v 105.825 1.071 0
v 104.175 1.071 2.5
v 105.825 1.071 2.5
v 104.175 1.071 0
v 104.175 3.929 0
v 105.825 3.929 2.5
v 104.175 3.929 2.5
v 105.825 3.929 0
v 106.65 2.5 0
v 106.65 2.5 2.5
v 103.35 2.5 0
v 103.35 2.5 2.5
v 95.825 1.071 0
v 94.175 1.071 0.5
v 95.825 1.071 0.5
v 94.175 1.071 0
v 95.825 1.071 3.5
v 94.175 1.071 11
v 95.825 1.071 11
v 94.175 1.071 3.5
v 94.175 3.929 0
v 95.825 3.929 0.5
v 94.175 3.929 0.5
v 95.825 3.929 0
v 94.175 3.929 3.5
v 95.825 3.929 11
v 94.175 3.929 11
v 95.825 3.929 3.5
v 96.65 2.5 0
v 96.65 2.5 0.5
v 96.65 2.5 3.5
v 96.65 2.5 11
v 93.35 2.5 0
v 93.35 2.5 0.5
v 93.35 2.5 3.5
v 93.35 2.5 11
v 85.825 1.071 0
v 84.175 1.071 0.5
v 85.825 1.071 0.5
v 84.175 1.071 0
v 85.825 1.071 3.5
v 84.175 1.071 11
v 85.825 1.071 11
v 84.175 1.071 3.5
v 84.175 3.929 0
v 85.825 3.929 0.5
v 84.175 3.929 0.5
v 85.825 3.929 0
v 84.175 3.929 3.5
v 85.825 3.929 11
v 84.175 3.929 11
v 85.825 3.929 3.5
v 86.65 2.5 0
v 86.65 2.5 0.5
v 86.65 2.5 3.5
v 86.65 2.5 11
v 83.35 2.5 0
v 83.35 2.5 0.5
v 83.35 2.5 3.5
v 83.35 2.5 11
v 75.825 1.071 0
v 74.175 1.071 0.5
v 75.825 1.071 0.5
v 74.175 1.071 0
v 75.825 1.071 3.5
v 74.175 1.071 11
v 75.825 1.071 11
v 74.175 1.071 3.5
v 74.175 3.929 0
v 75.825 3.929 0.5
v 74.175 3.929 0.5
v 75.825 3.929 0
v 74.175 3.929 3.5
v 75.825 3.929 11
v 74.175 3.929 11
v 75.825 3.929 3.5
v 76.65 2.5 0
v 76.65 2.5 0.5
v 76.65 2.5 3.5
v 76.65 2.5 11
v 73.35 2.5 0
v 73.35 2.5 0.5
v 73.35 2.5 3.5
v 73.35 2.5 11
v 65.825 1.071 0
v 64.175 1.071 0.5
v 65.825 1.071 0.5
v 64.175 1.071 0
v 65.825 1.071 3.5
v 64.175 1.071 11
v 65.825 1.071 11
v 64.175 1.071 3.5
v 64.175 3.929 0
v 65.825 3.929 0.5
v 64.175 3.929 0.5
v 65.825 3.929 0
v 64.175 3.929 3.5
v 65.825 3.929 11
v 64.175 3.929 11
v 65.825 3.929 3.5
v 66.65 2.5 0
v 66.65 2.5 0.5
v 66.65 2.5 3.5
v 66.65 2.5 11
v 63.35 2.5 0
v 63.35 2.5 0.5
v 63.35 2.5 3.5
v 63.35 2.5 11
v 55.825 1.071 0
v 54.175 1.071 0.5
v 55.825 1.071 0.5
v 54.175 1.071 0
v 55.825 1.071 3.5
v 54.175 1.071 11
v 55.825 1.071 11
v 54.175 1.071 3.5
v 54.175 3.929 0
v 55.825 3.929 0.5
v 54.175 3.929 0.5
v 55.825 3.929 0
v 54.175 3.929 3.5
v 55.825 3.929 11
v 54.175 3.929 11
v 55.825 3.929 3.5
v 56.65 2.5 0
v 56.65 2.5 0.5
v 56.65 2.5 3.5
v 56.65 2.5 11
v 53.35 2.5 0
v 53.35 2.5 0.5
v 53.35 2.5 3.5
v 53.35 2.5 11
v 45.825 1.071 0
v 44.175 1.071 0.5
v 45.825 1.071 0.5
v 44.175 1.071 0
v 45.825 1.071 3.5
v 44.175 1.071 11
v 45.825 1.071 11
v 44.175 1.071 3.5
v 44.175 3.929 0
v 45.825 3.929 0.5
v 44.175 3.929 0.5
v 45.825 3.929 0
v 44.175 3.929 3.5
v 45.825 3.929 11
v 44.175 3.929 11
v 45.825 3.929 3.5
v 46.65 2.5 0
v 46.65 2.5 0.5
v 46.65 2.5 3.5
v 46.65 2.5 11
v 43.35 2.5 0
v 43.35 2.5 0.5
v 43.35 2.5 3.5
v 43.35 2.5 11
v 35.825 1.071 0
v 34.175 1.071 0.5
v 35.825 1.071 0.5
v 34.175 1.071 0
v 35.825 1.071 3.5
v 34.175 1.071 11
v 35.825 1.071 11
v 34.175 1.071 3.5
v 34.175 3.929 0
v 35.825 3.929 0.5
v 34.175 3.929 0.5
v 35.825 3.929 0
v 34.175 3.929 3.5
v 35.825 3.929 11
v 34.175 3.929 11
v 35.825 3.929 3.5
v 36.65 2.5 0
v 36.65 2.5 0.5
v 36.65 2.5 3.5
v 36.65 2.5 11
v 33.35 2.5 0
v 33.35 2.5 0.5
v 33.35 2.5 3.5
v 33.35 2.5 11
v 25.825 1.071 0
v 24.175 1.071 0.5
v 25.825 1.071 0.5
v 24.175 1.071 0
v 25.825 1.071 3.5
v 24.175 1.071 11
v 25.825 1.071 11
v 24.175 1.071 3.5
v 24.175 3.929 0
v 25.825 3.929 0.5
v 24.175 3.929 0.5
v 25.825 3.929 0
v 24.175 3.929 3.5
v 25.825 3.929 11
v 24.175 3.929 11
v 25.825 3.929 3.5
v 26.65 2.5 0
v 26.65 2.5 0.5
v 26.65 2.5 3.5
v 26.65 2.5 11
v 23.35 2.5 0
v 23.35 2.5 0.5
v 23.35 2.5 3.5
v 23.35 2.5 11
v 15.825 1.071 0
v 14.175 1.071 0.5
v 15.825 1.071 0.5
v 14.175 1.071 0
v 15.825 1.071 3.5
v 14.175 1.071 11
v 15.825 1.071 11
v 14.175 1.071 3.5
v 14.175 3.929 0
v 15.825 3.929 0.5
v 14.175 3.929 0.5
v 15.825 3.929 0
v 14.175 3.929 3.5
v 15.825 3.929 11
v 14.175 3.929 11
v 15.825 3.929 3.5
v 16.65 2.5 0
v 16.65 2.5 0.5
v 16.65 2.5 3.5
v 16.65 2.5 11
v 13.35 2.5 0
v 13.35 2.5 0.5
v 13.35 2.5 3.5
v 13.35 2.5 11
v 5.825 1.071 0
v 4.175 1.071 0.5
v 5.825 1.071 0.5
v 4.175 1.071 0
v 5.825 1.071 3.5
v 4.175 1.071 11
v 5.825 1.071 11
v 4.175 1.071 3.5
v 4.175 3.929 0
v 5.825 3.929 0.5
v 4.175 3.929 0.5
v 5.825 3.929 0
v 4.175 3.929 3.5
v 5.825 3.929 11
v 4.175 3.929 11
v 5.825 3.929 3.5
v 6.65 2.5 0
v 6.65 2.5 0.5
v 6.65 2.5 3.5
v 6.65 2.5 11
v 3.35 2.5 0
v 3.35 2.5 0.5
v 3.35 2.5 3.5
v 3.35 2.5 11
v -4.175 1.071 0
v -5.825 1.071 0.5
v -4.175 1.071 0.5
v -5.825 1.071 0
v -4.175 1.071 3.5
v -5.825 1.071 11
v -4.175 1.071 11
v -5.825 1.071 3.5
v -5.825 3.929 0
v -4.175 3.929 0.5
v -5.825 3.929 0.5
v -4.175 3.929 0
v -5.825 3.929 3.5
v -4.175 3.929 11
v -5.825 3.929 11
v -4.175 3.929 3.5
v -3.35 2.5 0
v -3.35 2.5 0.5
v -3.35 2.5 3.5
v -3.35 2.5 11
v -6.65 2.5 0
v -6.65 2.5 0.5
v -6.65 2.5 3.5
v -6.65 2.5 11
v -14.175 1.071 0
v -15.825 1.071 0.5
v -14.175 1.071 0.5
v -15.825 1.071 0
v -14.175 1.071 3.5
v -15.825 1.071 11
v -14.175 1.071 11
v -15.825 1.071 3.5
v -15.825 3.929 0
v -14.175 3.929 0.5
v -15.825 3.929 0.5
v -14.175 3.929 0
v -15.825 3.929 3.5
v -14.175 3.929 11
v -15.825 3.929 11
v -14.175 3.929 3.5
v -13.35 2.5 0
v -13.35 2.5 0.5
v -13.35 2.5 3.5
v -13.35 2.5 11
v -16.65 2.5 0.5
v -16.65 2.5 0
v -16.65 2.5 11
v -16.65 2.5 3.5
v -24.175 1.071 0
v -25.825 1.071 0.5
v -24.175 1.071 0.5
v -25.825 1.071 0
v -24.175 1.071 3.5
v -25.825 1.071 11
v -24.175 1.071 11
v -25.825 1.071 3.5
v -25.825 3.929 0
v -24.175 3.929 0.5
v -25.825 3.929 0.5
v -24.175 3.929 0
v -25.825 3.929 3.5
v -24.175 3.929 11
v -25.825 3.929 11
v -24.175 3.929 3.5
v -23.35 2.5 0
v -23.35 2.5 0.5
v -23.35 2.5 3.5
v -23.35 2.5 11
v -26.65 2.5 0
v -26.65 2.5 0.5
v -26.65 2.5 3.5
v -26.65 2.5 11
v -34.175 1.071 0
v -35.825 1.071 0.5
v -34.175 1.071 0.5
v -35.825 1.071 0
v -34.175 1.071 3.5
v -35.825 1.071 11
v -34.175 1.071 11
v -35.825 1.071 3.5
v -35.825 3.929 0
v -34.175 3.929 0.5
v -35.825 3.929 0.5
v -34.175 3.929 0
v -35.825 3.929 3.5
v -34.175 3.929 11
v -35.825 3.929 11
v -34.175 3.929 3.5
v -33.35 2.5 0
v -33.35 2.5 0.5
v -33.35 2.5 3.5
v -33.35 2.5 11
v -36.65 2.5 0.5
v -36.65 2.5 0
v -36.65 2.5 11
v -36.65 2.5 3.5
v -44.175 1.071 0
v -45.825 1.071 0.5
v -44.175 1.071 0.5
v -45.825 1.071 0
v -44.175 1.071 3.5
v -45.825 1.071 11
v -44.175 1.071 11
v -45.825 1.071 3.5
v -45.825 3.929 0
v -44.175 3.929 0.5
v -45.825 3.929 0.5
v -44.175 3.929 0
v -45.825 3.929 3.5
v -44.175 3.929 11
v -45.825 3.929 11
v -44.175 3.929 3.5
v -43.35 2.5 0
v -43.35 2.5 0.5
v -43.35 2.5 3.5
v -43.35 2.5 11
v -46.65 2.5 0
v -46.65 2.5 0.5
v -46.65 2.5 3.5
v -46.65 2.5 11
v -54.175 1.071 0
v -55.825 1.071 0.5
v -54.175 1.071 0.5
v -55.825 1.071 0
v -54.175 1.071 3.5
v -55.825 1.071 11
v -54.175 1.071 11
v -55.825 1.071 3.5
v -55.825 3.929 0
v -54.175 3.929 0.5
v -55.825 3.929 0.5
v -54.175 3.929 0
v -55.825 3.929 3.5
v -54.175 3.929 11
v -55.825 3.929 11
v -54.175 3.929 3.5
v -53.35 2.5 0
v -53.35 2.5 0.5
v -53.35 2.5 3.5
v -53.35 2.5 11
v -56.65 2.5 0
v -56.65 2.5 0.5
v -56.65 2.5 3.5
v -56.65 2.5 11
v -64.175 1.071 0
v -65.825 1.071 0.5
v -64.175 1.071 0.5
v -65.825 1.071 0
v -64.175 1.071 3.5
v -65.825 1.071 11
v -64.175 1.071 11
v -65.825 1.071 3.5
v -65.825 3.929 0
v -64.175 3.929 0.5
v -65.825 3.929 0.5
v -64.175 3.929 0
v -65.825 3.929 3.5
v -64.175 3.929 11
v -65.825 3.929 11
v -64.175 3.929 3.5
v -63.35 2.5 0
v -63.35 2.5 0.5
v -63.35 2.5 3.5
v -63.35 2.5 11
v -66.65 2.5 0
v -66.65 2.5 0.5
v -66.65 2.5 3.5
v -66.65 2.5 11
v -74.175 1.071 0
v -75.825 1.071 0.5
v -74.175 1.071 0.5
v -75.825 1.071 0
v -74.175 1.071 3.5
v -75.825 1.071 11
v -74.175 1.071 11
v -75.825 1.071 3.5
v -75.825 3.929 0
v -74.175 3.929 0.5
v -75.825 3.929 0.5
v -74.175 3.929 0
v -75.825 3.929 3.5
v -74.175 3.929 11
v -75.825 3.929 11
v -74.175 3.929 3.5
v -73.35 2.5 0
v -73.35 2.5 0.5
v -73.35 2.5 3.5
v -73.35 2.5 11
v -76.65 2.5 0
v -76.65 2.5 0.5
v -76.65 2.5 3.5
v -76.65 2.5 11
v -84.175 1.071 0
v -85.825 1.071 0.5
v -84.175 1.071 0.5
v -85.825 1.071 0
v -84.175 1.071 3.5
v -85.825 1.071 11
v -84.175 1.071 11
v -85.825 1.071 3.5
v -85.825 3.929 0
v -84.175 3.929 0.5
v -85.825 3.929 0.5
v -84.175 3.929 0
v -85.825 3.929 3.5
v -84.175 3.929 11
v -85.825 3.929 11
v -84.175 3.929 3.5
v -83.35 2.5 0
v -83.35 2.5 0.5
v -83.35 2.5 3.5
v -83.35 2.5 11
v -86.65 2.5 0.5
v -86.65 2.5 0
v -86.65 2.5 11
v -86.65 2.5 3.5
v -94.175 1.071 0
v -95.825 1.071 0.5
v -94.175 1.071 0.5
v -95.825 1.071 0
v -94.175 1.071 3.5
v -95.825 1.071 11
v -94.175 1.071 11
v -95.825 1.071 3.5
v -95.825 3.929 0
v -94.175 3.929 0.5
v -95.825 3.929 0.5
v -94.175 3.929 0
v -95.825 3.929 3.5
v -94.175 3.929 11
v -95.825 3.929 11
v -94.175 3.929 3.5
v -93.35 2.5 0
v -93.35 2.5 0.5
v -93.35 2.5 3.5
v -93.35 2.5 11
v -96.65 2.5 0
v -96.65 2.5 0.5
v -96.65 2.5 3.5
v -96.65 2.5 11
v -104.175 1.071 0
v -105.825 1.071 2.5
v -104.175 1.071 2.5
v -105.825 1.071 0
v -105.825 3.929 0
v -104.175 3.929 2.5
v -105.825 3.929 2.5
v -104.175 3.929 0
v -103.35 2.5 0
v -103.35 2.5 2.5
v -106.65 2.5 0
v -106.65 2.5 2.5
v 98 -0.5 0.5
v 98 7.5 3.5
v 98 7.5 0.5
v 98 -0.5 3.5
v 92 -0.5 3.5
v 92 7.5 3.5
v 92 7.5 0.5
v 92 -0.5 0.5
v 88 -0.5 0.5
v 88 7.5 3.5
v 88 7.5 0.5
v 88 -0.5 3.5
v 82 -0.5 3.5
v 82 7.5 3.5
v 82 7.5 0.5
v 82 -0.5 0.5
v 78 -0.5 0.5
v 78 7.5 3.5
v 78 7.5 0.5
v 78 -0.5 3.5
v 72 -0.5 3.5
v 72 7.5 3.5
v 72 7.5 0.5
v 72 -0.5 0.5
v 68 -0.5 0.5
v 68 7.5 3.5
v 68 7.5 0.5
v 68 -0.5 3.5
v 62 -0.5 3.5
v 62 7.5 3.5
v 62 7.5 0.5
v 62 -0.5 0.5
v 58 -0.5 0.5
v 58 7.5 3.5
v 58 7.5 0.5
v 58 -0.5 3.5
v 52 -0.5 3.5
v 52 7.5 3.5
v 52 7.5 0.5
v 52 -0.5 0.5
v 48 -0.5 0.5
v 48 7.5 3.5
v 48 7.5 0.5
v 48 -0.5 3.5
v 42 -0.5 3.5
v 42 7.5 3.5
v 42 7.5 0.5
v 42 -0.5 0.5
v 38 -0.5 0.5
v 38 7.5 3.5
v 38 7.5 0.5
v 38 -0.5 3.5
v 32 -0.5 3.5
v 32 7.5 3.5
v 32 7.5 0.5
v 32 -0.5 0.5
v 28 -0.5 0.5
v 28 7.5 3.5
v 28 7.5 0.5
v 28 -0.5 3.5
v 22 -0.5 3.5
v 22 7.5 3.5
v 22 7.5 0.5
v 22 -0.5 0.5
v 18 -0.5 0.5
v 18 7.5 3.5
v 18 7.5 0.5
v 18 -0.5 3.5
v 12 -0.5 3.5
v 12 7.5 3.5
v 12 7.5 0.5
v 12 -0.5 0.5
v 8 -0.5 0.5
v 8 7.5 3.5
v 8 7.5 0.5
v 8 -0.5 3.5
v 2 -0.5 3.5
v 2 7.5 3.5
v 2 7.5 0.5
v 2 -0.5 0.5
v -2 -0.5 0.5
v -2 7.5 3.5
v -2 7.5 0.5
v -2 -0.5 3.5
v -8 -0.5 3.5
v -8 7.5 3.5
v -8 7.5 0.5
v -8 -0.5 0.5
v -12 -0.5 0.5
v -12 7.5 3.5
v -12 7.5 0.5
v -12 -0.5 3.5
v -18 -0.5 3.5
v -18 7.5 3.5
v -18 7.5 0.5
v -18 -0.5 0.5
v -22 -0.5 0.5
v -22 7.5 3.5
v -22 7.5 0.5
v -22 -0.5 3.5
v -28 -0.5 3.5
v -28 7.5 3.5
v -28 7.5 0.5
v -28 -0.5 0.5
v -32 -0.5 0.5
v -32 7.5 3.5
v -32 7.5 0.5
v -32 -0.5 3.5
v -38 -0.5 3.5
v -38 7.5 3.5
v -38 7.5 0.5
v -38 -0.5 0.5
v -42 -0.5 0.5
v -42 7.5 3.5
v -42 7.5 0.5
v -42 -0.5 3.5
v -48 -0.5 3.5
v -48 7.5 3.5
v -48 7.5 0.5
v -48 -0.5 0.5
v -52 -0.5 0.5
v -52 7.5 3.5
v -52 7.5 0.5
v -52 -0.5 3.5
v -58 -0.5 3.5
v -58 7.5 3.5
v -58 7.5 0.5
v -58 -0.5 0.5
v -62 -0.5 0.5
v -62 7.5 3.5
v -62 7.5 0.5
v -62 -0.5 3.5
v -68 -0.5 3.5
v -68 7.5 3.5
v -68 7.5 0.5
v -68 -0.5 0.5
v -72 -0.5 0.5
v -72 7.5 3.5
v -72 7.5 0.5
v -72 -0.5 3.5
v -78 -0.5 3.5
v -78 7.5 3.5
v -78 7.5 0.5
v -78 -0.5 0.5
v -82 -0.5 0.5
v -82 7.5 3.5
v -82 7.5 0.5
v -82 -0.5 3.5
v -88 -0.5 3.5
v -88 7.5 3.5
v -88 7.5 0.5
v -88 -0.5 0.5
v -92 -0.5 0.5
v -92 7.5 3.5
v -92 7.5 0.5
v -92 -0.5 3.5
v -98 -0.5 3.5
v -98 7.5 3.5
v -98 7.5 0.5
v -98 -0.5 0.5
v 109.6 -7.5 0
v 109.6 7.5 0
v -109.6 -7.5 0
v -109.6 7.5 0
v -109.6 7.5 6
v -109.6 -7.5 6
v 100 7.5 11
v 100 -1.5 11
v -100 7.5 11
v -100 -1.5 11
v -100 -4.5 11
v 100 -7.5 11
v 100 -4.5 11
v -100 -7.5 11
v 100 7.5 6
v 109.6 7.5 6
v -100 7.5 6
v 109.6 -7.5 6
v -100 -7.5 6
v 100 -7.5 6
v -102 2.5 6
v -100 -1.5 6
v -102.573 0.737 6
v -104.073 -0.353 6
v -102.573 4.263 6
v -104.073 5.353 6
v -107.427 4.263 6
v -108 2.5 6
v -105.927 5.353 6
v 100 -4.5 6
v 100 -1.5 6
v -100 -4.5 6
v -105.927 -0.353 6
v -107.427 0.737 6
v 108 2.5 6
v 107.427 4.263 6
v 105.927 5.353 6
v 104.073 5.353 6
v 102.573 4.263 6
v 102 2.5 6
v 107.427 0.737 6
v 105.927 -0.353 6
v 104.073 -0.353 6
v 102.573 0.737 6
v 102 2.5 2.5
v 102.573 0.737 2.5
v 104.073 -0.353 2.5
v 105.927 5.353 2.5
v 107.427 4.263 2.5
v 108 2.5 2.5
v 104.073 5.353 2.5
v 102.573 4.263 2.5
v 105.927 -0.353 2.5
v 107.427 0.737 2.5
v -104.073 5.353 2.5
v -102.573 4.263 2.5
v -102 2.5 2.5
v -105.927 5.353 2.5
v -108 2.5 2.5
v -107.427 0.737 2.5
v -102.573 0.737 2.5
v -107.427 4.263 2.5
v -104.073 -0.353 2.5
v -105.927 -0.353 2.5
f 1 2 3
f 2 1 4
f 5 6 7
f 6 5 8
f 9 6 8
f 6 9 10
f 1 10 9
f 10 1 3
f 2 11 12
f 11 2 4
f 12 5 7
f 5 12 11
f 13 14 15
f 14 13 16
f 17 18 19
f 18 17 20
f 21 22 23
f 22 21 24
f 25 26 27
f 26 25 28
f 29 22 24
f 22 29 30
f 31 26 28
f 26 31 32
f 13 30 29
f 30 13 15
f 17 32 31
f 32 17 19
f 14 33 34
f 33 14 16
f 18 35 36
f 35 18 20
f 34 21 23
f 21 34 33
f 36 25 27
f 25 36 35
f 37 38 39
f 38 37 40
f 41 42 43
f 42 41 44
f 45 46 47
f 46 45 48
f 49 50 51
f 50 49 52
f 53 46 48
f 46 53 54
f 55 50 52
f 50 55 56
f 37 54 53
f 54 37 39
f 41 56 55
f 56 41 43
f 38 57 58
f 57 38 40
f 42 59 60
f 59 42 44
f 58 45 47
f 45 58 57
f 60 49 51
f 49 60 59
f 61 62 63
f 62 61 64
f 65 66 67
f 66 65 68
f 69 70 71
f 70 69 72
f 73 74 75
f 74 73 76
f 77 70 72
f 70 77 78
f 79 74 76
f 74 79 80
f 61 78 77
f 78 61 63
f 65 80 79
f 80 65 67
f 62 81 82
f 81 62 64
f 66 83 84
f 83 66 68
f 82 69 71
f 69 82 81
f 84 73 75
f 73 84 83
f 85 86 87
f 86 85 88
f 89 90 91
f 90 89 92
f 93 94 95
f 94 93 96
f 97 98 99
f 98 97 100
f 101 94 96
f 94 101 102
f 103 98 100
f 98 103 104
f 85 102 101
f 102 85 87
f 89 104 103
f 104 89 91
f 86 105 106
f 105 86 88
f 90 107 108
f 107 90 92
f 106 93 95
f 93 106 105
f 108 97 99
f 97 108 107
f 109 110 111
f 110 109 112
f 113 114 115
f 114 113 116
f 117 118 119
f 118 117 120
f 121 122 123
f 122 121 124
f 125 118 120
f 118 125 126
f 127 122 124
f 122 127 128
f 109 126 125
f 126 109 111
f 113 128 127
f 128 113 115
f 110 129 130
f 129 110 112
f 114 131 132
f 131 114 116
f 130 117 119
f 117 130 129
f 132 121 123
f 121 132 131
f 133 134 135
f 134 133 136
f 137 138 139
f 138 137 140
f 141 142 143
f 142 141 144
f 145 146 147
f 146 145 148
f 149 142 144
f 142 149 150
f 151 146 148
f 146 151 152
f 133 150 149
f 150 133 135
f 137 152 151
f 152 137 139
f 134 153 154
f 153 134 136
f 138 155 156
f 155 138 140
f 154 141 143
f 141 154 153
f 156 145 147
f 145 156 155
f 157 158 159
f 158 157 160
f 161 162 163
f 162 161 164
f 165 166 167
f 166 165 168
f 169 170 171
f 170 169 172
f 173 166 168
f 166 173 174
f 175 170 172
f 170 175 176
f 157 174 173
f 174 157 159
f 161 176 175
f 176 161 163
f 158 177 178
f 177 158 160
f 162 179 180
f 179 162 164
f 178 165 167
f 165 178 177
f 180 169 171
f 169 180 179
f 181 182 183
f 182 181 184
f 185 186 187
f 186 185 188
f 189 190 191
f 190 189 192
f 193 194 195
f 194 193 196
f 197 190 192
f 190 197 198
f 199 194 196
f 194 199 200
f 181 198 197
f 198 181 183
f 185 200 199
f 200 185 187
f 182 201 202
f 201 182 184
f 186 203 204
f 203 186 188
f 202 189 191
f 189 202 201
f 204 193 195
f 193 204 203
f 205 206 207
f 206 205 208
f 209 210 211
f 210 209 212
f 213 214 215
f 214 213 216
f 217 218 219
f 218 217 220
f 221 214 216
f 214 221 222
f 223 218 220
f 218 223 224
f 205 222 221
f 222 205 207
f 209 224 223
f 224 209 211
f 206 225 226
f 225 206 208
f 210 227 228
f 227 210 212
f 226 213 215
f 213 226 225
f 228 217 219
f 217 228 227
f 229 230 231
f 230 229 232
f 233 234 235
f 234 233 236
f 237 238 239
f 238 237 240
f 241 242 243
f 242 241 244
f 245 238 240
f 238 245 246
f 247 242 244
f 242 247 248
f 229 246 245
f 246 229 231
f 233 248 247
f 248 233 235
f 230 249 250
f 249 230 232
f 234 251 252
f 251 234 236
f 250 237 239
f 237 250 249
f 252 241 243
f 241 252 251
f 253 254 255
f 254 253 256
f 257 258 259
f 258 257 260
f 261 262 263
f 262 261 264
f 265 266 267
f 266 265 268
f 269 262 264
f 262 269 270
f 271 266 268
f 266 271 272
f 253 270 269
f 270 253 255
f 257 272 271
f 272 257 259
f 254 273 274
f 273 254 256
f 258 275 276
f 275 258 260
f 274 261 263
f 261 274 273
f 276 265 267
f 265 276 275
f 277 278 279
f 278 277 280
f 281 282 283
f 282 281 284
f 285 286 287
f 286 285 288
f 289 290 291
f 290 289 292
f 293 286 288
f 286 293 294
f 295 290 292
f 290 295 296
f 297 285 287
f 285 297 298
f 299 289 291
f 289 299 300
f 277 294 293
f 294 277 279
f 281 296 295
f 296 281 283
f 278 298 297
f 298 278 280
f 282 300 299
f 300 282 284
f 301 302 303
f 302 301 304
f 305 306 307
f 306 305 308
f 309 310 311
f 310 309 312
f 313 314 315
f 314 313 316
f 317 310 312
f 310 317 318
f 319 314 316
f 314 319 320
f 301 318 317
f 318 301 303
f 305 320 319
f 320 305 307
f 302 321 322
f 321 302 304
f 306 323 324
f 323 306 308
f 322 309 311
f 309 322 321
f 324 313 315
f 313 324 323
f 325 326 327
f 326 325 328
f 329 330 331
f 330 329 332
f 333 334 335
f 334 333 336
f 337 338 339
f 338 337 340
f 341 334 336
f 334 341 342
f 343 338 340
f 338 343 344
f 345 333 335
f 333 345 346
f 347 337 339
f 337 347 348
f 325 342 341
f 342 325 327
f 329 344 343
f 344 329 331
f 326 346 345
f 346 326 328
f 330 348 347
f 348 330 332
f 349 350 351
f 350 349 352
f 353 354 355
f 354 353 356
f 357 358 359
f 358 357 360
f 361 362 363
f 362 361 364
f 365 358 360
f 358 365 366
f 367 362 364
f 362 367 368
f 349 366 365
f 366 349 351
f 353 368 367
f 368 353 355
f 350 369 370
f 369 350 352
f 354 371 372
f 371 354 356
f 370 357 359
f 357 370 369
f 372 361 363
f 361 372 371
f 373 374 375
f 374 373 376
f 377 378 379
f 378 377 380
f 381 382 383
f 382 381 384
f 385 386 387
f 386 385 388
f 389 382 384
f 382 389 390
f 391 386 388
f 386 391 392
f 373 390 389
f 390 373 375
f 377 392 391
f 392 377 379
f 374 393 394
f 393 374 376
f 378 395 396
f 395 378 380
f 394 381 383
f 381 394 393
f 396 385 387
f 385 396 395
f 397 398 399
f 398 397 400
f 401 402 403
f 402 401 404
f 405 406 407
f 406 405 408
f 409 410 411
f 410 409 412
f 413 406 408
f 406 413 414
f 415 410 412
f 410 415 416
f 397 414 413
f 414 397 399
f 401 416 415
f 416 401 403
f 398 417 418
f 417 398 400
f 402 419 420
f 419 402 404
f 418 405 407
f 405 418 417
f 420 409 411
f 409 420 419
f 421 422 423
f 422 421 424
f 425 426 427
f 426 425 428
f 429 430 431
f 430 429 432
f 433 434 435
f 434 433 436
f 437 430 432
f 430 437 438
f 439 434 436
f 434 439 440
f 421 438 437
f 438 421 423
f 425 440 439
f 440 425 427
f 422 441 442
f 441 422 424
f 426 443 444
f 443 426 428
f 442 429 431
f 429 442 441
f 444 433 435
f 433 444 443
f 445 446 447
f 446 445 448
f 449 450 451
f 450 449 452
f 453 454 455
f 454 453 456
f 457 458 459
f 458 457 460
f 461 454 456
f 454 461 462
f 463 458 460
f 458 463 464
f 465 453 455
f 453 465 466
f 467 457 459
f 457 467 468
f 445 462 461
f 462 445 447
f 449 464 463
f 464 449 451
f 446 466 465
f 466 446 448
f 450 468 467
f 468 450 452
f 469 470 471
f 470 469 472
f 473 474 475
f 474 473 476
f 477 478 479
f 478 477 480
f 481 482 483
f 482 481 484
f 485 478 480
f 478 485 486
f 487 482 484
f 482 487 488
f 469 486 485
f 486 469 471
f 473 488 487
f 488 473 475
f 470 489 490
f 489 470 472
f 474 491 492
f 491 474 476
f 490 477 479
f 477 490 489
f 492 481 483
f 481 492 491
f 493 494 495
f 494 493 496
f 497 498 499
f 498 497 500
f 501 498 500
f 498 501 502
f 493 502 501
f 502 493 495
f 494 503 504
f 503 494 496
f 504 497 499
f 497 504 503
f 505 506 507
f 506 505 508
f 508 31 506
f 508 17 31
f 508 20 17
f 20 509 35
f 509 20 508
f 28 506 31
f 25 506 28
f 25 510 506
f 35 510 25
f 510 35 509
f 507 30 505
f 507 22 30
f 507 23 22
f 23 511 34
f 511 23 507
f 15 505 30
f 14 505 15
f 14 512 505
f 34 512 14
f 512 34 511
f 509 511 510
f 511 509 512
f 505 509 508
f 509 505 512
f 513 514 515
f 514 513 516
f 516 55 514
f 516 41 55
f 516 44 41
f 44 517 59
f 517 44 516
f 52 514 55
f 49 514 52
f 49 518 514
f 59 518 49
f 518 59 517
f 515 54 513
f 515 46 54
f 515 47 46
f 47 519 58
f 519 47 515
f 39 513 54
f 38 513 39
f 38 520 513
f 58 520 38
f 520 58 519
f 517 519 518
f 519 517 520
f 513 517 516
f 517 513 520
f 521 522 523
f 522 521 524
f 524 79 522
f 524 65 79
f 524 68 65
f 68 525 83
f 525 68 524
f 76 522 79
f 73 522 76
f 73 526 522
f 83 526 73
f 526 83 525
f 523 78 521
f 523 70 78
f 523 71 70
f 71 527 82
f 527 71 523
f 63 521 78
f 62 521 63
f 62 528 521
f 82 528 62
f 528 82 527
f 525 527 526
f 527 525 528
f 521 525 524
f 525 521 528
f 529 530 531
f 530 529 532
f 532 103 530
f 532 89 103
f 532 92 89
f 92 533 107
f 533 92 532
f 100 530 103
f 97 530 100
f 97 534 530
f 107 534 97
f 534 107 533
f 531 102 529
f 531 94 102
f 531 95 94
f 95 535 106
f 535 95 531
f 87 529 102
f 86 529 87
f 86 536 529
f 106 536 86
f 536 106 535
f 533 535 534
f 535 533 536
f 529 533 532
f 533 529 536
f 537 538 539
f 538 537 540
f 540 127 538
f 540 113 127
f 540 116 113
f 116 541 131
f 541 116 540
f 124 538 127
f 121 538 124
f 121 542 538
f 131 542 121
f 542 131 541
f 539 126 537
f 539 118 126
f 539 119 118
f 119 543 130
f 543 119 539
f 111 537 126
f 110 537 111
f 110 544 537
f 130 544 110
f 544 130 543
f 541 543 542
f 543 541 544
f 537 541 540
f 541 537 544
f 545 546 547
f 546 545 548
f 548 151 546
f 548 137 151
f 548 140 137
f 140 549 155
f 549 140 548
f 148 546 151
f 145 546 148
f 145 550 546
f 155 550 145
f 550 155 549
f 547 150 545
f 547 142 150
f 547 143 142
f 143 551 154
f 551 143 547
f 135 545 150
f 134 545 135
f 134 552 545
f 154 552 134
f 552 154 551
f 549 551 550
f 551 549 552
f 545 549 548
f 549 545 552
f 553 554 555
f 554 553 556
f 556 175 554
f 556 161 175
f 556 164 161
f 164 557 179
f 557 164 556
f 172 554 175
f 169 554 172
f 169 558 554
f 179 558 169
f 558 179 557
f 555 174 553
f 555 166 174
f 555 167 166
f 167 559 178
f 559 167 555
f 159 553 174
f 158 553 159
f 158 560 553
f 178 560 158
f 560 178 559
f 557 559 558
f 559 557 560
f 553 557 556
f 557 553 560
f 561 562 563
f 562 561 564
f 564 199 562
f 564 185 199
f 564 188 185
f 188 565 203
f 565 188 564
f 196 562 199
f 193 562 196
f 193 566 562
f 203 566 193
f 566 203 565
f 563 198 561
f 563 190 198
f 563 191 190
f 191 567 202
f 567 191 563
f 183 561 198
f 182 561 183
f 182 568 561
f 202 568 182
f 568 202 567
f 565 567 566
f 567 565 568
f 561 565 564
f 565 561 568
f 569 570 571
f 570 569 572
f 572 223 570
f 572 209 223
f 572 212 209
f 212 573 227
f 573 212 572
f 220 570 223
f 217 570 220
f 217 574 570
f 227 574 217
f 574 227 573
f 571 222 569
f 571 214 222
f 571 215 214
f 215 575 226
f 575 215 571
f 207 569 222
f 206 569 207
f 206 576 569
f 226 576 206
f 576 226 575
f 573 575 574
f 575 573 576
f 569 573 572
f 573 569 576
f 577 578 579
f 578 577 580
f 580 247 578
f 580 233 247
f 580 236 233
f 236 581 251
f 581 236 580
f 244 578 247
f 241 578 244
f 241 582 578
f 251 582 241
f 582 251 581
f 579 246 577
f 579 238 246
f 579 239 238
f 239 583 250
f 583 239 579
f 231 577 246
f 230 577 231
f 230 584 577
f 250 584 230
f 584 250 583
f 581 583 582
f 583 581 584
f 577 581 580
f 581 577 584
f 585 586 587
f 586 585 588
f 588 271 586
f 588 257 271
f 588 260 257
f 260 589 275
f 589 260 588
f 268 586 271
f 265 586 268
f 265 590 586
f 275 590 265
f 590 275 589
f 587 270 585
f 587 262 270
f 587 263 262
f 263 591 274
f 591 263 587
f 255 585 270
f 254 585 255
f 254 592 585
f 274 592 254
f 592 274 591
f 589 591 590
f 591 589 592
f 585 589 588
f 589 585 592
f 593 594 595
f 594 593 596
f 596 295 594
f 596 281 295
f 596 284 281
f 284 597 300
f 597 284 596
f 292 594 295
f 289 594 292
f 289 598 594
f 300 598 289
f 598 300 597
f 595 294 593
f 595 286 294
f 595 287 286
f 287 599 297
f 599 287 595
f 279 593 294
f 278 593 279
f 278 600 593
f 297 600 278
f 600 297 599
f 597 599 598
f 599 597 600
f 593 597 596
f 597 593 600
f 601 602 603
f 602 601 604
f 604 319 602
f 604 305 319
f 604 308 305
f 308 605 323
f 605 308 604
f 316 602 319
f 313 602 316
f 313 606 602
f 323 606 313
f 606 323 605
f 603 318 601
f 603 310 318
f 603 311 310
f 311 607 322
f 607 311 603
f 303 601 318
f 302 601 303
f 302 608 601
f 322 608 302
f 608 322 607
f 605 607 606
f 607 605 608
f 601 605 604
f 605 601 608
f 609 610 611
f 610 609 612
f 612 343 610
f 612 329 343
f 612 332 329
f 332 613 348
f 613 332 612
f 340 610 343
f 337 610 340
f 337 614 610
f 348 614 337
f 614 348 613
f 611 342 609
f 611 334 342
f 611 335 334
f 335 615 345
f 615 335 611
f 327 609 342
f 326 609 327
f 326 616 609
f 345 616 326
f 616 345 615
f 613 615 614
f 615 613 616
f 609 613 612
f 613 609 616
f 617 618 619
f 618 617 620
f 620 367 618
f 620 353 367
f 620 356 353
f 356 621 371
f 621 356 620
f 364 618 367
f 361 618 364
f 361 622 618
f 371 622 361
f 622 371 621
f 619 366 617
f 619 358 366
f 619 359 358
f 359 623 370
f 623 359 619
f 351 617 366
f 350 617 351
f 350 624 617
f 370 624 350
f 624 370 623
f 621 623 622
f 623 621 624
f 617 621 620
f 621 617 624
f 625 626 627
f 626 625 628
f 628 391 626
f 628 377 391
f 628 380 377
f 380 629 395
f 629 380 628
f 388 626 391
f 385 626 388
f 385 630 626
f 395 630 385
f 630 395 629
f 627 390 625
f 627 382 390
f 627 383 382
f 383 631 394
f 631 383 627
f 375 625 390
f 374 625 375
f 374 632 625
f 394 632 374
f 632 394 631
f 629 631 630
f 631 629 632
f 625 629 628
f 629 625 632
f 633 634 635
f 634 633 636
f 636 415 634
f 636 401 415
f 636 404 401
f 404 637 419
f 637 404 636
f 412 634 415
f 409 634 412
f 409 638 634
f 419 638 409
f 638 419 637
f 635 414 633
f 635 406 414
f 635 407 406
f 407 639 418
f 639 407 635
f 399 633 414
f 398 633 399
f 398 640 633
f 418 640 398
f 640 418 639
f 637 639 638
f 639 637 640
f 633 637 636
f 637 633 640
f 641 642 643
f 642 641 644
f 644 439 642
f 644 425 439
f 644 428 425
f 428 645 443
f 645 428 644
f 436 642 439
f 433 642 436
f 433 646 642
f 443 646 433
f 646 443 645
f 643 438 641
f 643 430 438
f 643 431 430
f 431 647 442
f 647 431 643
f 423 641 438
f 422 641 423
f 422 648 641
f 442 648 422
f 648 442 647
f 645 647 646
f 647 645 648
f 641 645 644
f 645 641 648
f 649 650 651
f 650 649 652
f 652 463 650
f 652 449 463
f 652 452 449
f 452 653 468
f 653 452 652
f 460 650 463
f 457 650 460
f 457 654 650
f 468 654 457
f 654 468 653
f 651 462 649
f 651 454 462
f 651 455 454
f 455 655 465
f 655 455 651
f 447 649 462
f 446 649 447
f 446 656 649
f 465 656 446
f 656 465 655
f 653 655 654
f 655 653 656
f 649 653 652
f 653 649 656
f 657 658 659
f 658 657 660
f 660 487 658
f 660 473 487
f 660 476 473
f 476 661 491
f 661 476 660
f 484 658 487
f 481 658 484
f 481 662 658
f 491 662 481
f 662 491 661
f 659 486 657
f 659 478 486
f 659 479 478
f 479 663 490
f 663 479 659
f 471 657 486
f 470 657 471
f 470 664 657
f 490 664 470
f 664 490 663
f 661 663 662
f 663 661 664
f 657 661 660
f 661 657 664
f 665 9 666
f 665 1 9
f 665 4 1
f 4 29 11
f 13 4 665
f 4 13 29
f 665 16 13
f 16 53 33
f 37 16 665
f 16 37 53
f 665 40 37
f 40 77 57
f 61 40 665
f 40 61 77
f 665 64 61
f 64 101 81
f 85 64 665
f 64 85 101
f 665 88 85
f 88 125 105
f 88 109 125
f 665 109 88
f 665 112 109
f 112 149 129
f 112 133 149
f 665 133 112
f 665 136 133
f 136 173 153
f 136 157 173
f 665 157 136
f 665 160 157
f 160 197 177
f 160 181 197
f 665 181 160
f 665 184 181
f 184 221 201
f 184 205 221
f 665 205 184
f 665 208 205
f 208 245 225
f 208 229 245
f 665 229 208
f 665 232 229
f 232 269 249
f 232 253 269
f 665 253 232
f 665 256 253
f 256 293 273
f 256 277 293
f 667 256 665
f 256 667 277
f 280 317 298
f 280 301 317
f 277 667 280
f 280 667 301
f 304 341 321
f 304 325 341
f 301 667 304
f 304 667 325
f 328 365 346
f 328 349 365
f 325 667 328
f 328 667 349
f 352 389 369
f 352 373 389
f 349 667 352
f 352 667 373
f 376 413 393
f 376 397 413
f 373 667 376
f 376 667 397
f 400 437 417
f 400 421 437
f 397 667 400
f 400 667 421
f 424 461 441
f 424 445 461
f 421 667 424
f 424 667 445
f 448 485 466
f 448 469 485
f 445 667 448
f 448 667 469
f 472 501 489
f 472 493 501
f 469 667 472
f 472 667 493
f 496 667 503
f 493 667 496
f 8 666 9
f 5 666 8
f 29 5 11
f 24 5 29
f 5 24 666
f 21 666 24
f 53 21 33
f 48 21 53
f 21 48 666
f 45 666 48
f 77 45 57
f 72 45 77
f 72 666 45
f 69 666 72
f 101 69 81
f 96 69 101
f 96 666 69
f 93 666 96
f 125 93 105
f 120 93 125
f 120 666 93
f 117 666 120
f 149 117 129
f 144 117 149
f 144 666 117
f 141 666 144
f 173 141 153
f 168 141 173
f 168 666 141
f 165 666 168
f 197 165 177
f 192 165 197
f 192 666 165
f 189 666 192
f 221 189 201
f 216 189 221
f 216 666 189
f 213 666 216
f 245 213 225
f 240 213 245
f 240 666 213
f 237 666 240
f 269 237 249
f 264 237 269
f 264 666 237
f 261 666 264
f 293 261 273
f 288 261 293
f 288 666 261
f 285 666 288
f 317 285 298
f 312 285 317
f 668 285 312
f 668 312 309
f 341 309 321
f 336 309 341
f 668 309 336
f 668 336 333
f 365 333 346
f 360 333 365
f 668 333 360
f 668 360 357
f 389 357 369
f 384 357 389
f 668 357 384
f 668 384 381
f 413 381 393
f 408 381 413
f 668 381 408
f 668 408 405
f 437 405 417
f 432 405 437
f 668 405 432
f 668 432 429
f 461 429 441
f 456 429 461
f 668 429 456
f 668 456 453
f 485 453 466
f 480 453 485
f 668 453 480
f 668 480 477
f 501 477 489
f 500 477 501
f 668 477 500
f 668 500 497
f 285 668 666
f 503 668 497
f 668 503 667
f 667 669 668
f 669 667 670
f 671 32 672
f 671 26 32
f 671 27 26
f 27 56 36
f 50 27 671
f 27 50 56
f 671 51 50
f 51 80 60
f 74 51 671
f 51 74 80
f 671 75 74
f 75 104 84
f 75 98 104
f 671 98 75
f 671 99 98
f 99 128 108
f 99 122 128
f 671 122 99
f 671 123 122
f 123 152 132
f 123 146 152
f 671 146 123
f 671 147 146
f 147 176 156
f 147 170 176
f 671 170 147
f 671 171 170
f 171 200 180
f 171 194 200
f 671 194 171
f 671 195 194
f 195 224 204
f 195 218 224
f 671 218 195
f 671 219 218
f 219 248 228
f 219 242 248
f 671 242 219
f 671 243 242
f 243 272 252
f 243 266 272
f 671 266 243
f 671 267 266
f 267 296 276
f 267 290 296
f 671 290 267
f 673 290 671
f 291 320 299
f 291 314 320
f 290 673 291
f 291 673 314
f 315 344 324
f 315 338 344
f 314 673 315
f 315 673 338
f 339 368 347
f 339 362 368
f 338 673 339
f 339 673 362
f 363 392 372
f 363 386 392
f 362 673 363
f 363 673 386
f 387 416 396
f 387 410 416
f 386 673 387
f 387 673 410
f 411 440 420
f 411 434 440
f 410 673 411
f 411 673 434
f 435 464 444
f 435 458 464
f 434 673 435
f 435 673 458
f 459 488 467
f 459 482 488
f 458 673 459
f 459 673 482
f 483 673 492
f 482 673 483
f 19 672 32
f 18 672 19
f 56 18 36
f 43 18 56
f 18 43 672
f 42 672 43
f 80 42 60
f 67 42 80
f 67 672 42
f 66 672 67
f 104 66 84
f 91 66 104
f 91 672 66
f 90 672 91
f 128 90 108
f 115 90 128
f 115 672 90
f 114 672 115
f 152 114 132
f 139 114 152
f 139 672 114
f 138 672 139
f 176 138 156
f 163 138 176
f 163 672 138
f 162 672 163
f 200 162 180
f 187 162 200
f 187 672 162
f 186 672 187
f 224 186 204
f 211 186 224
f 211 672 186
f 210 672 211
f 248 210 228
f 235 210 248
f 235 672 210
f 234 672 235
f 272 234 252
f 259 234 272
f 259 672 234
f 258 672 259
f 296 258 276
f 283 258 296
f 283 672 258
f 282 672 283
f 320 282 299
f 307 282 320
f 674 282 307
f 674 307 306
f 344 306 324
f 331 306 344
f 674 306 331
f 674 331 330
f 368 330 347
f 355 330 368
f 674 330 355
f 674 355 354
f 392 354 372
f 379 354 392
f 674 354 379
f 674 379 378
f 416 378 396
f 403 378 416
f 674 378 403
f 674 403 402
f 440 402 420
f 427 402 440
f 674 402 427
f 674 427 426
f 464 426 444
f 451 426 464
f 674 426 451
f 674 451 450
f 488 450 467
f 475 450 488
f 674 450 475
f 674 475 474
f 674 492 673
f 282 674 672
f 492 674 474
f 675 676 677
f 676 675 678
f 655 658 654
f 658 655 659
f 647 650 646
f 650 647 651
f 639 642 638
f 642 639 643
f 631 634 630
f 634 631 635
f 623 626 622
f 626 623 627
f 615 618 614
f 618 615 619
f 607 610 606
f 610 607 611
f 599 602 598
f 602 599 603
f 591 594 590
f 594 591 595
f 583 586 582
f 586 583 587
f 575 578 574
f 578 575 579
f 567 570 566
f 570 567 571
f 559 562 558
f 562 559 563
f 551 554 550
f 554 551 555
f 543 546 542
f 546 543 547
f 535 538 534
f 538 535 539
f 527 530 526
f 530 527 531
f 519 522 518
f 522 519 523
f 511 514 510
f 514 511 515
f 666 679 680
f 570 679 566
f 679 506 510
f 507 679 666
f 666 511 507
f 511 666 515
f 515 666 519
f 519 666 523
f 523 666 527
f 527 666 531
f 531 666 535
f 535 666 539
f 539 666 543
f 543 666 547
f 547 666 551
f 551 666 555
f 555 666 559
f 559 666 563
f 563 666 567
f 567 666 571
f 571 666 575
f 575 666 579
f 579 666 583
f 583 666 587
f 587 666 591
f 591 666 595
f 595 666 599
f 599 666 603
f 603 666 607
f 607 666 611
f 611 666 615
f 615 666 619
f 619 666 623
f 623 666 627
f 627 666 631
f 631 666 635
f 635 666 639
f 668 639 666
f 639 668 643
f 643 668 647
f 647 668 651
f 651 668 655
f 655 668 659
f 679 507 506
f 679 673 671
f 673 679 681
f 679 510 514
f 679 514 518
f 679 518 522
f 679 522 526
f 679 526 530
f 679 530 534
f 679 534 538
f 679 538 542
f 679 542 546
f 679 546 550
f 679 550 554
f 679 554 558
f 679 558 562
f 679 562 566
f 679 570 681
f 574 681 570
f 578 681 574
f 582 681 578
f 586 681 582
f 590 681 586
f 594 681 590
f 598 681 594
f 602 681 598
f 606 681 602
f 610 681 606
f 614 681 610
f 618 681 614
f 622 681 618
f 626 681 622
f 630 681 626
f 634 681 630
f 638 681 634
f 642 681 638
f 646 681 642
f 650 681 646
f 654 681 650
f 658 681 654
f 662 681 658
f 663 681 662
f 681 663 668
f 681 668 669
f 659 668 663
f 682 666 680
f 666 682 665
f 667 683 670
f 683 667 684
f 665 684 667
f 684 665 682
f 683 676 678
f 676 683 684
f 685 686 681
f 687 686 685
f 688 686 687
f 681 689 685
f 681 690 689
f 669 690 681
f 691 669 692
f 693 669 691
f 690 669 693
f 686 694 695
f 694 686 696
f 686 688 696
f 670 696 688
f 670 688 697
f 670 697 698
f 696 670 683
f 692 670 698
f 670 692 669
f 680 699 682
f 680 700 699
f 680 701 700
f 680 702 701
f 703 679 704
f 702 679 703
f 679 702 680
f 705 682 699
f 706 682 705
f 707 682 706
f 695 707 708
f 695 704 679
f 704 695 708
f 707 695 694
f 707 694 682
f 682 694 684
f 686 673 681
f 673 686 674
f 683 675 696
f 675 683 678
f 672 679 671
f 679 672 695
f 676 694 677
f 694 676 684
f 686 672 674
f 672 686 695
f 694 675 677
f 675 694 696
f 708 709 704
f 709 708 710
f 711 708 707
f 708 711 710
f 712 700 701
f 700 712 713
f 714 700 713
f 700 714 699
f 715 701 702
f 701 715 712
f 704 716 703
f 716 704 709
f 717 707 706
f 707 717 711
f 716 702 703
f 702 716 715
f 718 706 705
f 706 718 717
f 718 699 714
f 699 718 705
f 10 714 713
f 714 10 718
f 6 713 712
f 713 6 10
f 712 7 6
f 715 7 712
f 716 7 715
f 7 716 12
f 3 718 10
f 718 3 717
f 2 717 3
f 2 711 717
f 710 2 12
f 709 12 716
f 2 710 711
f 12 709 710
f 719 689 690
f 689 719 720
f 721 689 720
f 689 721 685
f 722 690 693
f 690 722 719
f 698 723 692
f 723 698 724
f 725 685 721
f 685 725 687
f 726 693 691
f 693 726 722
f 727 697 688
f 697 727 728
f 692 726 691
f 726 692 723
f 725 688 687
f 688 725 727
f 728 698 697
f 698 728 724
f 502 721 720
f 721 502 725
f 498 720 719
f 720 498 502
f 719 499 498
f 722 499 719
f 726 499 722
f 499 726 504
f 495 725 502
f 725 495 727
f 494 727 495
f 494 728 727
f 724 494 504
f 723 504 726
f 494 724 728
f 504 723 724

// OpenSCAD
vzdalenost_der = 10; //rozteč děr mezi sebou
pocet_der = 21; //pocet ter pres ktere je lista ponížené o 1

//rozměry výrezu
//rozmer v ose y
vzdalenost_od_okraje = 10; //vzdalenost stredu upevnovaci diry od kraje desky
vzdalenost_od_diry = 5; //vzdalenost od stredu upevnovaci diry na druhou stranu

//rozmery vyrezu v ose x
vzdalenost_1 = 4.6; //od díry ke kraji
vzdalenost_2 = 5;

//definicce celkové výšky lišty
zapust=6; //závislé na sloupku
vyska_listy=5;

//parametry pro úžlabinu
tlouska_celicka = 3; //definuje uzlabinu
sirka_materialu = 3; //sirka materialu od kraje desky k uzlabine

//parametry šroubu
vyska_hlavy = 3.5;
prumer_hlavy=6;
prumer_sroubu=3.3;

//parametry matice
prumer_matice=6; //hrany k hraně
vyska_matice=3;  //vyska matice
posuv_dorazu=0;  //pro moznost posuvu dorazu pro vsunutí matice
matice_sila_materialu=2; //sila materialu pod maticí na ose z

difference () {
color("cyan")
    translate([0, 0, 0])
        linear_extrude(height = zapust+vyska_listy)
            square([((pocet_der*vzdalenost_der)+2*vzdalenost_1), vzdalenost_od_okraje+vzdalenost_od_diry], center = true); 
    
    translate([-((((pocet_der*vzdalenost_der)+2*vzdalenost_1)/2)-(vzdalenost_1+vzdalenost_2/2)), 0, (zapust)])
        linear_extrude(height = vyska_listy)
            square([vzdalenost_2, vzdalenost_od_okraje+vzdalenost_od_diry], center = true); 
    
    translate([((((pocet_der*vzdalenost_der)+2*vzdalenost_1)/2)-(vzdalenost_1+vzdalenost_2/2)), 0, (zapust)])
        linear_extrude(height = vyska_listy)
            square([vzdalenost_2, vzdalenost_od_okraje+vzdalenost_od_diry], center = true); 
    
    translate([-((((pocet_der*vzdalenost_der)+2*vzdalenost_1)/2)-(vzdalenost_1/2)), 0, (zapust)])
        linear_extrude(height = vyska_listy)
            square([vzdalenost_1, vzdalenost_od_okraje+vzdalenost_od_diry], center = true); 
    
    translate([((((pocet_der*vzdalenost_der)+2*vzdalenost_1)/2)-(vzdalenost_1/2)), 0, (zapust)])
        linear_extrude(height = vyska_listy)
            square([vzdalenost_1, vzdalenost_od_okraje+vzdalenost_od_diry], center = true); 
    
     translate([0,-((((vzdalenost_od_okraje+vzdalenost_od_diry)/2)-sirka_materialu)-(tlouska_celicka/2)), zapust])
        linear_extrude(height = vyska_listy)
            square([((pocet_der*vzdalenost_der)+2*vzdalenost_1), tlouska_celicka], center = true); 
   
    
    //otvory pro hlavy sroubu
    
    translate([vzdalenost_der*pocet_der/2,-(((vzdalenost_od_okraje+vzdalenost_od_diry)/2)-vzdalenost_od_okraje),(zapust-vyska_hlavy)+vyska_hlavy/2])  // center top screw
        cylinder(vyska_hlavy, d=prumer_hlavy, center=true);
        
     translate([-vzdalenost_der*pocet_der/2,-(((vzdalenost_od_okraje+vzdalenost_od_diry)/2)-vzdalenost_od_okraje),(zapust-vyska_hlavy)+vyska_hlavy/2])  // center top screw
        cylinder(vyska_hlavy, d=prumer_hlavy, center=true);
 
//otvory pro srouby

 for (i = [0:1:pocet_der]) {      
 translate([(-i*vzdalenost_der)+vzdalenost_der*pocet_der/2,-(((vzdalenost_od_okraje+vzdalenost_od_diry)/2)-vzdalenost_od_okraje),(zapust-vyska_hlavy)+vyska_hlavy/2])  // center top screw
        cylinder((2*(zapust+vyska_listy)), d=prumer_sroubu, center=true); 
      }
//otvory pro matice
     
 for (i = [1:1:(pocet_der-1)]) {      
 translate([(-i*vzdalenost_der)+vzdalenost_der*pocet_der/2,-((((vzdalenost_od_okraje+vzdalenost_od_diry)/2)-vzdalenost_od_okraje)-((((prumer_matice+posuv_dorazu+vzdalenost_od_diry)/2))-(prumer_matice+posuv_dorazu)/2)),matice_sila_materialu])  // center top screw
      cube([prumer_matice, prumer_matice+posuv_dorazu+vzdalenost_od_diry,vyska_matice], center = true);
  
     }       
        
        
        
         }
         
       
